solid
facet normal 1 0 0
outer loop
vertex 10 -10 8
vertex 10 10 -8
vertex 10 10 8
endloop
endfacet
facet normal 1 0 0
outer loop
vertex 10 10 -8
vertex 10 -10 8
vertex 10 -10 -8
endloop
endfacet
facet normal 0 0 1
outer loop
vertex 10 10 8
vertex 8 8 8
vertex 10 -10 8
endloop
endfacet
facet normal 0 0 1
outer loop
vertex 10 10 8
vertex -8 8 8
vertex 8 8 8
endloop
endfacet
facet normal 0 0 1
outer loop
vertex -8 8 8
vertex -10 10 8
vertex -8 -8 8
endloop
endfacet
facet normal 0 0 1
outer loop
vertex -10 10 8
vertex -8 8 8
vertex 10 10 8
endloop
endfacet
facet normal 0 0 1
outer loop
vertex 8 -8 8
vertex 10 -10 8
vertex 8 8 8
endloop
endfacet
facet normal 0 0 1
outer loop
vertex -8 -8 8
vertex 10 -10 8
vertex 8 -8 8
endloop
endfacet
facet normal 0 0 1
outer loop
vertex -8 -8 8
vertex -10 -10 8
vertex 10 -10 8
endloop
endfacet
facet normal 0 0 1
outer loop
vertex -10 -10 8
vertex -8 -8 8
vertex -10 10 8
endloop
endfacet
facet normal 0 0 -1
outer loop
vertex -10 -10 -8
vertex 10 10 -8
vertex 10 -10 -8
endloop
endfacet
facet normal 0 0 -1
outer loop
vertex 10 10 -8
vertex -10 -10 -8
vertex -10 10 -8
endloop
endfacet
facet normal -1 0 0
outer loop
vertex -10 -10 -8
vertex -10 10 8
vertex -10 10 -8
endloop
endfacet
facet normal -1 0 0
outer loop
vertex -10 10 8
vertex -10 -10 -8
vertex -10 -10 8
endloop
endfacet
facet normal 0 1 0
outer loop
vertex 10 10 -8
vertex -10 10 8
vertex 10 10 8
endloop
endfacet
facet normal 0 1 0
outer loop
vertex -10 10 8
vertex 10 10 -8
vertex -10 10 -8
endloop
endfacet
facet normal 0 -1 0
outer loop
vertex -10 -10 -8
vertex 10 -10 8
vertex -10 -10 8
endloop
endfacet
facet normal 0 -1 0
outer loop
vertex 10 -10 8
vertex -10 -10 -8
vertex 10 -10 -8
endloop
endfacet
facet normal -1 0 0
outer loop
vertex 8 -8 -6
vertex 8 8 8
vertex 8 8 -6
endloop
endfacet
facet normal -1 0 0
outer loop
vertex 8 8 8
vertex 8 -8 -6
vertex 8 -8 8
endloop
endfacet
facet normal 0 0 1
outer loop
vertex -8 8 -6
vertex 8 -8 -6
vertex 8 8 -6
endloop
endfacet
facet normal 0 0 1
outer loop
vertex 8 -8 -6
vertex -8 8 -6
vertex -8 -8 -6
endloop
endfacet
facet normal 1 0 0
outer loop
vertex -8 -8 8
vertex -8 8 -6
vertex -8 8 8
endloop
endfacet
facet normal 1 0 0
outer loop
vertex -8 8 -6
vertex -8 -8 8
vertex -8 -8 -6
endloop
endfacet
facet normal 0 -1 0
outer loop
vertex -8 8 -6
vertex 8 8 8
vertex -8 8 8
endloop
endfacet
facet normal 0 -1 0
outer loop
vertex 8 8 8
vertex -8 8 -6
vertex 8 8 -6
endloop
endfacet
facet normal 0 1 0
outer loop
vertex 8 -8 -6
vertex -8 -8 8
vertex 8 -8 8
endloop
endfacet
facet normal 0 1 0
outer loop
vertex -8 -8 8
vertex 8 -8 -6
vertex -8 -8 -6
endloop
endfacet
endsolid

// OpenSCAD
// examples/cube.scad — a trivial test part for the `3d` CLI.
// A rounded-ish hollow box with a couple of Customizer parameters, so
// `3d params`, `render`, `export`, `mesh`, `check`, `printability` all have
// something real to chew on.

width  = 20;   // [10:40] outer width (mm)
depth  = 20;   // [10:40] outer depth (mm)
height = 16;   // [8:30]  outer height (mm)
wall   = 2;    // [1.2:4] wall thickness (mm)

module hollow_box(w, d, h, t) {
    difference() {
        cube([w, d, h], center = true);
        // inner cavity, open-topped, leaves a floor of thickness t
        translate([0, 0, t])
            cube([w - 2 * t, d - 2 * t, h], center = true);
    }
}

hollow_box(width, depth, height, wall);
